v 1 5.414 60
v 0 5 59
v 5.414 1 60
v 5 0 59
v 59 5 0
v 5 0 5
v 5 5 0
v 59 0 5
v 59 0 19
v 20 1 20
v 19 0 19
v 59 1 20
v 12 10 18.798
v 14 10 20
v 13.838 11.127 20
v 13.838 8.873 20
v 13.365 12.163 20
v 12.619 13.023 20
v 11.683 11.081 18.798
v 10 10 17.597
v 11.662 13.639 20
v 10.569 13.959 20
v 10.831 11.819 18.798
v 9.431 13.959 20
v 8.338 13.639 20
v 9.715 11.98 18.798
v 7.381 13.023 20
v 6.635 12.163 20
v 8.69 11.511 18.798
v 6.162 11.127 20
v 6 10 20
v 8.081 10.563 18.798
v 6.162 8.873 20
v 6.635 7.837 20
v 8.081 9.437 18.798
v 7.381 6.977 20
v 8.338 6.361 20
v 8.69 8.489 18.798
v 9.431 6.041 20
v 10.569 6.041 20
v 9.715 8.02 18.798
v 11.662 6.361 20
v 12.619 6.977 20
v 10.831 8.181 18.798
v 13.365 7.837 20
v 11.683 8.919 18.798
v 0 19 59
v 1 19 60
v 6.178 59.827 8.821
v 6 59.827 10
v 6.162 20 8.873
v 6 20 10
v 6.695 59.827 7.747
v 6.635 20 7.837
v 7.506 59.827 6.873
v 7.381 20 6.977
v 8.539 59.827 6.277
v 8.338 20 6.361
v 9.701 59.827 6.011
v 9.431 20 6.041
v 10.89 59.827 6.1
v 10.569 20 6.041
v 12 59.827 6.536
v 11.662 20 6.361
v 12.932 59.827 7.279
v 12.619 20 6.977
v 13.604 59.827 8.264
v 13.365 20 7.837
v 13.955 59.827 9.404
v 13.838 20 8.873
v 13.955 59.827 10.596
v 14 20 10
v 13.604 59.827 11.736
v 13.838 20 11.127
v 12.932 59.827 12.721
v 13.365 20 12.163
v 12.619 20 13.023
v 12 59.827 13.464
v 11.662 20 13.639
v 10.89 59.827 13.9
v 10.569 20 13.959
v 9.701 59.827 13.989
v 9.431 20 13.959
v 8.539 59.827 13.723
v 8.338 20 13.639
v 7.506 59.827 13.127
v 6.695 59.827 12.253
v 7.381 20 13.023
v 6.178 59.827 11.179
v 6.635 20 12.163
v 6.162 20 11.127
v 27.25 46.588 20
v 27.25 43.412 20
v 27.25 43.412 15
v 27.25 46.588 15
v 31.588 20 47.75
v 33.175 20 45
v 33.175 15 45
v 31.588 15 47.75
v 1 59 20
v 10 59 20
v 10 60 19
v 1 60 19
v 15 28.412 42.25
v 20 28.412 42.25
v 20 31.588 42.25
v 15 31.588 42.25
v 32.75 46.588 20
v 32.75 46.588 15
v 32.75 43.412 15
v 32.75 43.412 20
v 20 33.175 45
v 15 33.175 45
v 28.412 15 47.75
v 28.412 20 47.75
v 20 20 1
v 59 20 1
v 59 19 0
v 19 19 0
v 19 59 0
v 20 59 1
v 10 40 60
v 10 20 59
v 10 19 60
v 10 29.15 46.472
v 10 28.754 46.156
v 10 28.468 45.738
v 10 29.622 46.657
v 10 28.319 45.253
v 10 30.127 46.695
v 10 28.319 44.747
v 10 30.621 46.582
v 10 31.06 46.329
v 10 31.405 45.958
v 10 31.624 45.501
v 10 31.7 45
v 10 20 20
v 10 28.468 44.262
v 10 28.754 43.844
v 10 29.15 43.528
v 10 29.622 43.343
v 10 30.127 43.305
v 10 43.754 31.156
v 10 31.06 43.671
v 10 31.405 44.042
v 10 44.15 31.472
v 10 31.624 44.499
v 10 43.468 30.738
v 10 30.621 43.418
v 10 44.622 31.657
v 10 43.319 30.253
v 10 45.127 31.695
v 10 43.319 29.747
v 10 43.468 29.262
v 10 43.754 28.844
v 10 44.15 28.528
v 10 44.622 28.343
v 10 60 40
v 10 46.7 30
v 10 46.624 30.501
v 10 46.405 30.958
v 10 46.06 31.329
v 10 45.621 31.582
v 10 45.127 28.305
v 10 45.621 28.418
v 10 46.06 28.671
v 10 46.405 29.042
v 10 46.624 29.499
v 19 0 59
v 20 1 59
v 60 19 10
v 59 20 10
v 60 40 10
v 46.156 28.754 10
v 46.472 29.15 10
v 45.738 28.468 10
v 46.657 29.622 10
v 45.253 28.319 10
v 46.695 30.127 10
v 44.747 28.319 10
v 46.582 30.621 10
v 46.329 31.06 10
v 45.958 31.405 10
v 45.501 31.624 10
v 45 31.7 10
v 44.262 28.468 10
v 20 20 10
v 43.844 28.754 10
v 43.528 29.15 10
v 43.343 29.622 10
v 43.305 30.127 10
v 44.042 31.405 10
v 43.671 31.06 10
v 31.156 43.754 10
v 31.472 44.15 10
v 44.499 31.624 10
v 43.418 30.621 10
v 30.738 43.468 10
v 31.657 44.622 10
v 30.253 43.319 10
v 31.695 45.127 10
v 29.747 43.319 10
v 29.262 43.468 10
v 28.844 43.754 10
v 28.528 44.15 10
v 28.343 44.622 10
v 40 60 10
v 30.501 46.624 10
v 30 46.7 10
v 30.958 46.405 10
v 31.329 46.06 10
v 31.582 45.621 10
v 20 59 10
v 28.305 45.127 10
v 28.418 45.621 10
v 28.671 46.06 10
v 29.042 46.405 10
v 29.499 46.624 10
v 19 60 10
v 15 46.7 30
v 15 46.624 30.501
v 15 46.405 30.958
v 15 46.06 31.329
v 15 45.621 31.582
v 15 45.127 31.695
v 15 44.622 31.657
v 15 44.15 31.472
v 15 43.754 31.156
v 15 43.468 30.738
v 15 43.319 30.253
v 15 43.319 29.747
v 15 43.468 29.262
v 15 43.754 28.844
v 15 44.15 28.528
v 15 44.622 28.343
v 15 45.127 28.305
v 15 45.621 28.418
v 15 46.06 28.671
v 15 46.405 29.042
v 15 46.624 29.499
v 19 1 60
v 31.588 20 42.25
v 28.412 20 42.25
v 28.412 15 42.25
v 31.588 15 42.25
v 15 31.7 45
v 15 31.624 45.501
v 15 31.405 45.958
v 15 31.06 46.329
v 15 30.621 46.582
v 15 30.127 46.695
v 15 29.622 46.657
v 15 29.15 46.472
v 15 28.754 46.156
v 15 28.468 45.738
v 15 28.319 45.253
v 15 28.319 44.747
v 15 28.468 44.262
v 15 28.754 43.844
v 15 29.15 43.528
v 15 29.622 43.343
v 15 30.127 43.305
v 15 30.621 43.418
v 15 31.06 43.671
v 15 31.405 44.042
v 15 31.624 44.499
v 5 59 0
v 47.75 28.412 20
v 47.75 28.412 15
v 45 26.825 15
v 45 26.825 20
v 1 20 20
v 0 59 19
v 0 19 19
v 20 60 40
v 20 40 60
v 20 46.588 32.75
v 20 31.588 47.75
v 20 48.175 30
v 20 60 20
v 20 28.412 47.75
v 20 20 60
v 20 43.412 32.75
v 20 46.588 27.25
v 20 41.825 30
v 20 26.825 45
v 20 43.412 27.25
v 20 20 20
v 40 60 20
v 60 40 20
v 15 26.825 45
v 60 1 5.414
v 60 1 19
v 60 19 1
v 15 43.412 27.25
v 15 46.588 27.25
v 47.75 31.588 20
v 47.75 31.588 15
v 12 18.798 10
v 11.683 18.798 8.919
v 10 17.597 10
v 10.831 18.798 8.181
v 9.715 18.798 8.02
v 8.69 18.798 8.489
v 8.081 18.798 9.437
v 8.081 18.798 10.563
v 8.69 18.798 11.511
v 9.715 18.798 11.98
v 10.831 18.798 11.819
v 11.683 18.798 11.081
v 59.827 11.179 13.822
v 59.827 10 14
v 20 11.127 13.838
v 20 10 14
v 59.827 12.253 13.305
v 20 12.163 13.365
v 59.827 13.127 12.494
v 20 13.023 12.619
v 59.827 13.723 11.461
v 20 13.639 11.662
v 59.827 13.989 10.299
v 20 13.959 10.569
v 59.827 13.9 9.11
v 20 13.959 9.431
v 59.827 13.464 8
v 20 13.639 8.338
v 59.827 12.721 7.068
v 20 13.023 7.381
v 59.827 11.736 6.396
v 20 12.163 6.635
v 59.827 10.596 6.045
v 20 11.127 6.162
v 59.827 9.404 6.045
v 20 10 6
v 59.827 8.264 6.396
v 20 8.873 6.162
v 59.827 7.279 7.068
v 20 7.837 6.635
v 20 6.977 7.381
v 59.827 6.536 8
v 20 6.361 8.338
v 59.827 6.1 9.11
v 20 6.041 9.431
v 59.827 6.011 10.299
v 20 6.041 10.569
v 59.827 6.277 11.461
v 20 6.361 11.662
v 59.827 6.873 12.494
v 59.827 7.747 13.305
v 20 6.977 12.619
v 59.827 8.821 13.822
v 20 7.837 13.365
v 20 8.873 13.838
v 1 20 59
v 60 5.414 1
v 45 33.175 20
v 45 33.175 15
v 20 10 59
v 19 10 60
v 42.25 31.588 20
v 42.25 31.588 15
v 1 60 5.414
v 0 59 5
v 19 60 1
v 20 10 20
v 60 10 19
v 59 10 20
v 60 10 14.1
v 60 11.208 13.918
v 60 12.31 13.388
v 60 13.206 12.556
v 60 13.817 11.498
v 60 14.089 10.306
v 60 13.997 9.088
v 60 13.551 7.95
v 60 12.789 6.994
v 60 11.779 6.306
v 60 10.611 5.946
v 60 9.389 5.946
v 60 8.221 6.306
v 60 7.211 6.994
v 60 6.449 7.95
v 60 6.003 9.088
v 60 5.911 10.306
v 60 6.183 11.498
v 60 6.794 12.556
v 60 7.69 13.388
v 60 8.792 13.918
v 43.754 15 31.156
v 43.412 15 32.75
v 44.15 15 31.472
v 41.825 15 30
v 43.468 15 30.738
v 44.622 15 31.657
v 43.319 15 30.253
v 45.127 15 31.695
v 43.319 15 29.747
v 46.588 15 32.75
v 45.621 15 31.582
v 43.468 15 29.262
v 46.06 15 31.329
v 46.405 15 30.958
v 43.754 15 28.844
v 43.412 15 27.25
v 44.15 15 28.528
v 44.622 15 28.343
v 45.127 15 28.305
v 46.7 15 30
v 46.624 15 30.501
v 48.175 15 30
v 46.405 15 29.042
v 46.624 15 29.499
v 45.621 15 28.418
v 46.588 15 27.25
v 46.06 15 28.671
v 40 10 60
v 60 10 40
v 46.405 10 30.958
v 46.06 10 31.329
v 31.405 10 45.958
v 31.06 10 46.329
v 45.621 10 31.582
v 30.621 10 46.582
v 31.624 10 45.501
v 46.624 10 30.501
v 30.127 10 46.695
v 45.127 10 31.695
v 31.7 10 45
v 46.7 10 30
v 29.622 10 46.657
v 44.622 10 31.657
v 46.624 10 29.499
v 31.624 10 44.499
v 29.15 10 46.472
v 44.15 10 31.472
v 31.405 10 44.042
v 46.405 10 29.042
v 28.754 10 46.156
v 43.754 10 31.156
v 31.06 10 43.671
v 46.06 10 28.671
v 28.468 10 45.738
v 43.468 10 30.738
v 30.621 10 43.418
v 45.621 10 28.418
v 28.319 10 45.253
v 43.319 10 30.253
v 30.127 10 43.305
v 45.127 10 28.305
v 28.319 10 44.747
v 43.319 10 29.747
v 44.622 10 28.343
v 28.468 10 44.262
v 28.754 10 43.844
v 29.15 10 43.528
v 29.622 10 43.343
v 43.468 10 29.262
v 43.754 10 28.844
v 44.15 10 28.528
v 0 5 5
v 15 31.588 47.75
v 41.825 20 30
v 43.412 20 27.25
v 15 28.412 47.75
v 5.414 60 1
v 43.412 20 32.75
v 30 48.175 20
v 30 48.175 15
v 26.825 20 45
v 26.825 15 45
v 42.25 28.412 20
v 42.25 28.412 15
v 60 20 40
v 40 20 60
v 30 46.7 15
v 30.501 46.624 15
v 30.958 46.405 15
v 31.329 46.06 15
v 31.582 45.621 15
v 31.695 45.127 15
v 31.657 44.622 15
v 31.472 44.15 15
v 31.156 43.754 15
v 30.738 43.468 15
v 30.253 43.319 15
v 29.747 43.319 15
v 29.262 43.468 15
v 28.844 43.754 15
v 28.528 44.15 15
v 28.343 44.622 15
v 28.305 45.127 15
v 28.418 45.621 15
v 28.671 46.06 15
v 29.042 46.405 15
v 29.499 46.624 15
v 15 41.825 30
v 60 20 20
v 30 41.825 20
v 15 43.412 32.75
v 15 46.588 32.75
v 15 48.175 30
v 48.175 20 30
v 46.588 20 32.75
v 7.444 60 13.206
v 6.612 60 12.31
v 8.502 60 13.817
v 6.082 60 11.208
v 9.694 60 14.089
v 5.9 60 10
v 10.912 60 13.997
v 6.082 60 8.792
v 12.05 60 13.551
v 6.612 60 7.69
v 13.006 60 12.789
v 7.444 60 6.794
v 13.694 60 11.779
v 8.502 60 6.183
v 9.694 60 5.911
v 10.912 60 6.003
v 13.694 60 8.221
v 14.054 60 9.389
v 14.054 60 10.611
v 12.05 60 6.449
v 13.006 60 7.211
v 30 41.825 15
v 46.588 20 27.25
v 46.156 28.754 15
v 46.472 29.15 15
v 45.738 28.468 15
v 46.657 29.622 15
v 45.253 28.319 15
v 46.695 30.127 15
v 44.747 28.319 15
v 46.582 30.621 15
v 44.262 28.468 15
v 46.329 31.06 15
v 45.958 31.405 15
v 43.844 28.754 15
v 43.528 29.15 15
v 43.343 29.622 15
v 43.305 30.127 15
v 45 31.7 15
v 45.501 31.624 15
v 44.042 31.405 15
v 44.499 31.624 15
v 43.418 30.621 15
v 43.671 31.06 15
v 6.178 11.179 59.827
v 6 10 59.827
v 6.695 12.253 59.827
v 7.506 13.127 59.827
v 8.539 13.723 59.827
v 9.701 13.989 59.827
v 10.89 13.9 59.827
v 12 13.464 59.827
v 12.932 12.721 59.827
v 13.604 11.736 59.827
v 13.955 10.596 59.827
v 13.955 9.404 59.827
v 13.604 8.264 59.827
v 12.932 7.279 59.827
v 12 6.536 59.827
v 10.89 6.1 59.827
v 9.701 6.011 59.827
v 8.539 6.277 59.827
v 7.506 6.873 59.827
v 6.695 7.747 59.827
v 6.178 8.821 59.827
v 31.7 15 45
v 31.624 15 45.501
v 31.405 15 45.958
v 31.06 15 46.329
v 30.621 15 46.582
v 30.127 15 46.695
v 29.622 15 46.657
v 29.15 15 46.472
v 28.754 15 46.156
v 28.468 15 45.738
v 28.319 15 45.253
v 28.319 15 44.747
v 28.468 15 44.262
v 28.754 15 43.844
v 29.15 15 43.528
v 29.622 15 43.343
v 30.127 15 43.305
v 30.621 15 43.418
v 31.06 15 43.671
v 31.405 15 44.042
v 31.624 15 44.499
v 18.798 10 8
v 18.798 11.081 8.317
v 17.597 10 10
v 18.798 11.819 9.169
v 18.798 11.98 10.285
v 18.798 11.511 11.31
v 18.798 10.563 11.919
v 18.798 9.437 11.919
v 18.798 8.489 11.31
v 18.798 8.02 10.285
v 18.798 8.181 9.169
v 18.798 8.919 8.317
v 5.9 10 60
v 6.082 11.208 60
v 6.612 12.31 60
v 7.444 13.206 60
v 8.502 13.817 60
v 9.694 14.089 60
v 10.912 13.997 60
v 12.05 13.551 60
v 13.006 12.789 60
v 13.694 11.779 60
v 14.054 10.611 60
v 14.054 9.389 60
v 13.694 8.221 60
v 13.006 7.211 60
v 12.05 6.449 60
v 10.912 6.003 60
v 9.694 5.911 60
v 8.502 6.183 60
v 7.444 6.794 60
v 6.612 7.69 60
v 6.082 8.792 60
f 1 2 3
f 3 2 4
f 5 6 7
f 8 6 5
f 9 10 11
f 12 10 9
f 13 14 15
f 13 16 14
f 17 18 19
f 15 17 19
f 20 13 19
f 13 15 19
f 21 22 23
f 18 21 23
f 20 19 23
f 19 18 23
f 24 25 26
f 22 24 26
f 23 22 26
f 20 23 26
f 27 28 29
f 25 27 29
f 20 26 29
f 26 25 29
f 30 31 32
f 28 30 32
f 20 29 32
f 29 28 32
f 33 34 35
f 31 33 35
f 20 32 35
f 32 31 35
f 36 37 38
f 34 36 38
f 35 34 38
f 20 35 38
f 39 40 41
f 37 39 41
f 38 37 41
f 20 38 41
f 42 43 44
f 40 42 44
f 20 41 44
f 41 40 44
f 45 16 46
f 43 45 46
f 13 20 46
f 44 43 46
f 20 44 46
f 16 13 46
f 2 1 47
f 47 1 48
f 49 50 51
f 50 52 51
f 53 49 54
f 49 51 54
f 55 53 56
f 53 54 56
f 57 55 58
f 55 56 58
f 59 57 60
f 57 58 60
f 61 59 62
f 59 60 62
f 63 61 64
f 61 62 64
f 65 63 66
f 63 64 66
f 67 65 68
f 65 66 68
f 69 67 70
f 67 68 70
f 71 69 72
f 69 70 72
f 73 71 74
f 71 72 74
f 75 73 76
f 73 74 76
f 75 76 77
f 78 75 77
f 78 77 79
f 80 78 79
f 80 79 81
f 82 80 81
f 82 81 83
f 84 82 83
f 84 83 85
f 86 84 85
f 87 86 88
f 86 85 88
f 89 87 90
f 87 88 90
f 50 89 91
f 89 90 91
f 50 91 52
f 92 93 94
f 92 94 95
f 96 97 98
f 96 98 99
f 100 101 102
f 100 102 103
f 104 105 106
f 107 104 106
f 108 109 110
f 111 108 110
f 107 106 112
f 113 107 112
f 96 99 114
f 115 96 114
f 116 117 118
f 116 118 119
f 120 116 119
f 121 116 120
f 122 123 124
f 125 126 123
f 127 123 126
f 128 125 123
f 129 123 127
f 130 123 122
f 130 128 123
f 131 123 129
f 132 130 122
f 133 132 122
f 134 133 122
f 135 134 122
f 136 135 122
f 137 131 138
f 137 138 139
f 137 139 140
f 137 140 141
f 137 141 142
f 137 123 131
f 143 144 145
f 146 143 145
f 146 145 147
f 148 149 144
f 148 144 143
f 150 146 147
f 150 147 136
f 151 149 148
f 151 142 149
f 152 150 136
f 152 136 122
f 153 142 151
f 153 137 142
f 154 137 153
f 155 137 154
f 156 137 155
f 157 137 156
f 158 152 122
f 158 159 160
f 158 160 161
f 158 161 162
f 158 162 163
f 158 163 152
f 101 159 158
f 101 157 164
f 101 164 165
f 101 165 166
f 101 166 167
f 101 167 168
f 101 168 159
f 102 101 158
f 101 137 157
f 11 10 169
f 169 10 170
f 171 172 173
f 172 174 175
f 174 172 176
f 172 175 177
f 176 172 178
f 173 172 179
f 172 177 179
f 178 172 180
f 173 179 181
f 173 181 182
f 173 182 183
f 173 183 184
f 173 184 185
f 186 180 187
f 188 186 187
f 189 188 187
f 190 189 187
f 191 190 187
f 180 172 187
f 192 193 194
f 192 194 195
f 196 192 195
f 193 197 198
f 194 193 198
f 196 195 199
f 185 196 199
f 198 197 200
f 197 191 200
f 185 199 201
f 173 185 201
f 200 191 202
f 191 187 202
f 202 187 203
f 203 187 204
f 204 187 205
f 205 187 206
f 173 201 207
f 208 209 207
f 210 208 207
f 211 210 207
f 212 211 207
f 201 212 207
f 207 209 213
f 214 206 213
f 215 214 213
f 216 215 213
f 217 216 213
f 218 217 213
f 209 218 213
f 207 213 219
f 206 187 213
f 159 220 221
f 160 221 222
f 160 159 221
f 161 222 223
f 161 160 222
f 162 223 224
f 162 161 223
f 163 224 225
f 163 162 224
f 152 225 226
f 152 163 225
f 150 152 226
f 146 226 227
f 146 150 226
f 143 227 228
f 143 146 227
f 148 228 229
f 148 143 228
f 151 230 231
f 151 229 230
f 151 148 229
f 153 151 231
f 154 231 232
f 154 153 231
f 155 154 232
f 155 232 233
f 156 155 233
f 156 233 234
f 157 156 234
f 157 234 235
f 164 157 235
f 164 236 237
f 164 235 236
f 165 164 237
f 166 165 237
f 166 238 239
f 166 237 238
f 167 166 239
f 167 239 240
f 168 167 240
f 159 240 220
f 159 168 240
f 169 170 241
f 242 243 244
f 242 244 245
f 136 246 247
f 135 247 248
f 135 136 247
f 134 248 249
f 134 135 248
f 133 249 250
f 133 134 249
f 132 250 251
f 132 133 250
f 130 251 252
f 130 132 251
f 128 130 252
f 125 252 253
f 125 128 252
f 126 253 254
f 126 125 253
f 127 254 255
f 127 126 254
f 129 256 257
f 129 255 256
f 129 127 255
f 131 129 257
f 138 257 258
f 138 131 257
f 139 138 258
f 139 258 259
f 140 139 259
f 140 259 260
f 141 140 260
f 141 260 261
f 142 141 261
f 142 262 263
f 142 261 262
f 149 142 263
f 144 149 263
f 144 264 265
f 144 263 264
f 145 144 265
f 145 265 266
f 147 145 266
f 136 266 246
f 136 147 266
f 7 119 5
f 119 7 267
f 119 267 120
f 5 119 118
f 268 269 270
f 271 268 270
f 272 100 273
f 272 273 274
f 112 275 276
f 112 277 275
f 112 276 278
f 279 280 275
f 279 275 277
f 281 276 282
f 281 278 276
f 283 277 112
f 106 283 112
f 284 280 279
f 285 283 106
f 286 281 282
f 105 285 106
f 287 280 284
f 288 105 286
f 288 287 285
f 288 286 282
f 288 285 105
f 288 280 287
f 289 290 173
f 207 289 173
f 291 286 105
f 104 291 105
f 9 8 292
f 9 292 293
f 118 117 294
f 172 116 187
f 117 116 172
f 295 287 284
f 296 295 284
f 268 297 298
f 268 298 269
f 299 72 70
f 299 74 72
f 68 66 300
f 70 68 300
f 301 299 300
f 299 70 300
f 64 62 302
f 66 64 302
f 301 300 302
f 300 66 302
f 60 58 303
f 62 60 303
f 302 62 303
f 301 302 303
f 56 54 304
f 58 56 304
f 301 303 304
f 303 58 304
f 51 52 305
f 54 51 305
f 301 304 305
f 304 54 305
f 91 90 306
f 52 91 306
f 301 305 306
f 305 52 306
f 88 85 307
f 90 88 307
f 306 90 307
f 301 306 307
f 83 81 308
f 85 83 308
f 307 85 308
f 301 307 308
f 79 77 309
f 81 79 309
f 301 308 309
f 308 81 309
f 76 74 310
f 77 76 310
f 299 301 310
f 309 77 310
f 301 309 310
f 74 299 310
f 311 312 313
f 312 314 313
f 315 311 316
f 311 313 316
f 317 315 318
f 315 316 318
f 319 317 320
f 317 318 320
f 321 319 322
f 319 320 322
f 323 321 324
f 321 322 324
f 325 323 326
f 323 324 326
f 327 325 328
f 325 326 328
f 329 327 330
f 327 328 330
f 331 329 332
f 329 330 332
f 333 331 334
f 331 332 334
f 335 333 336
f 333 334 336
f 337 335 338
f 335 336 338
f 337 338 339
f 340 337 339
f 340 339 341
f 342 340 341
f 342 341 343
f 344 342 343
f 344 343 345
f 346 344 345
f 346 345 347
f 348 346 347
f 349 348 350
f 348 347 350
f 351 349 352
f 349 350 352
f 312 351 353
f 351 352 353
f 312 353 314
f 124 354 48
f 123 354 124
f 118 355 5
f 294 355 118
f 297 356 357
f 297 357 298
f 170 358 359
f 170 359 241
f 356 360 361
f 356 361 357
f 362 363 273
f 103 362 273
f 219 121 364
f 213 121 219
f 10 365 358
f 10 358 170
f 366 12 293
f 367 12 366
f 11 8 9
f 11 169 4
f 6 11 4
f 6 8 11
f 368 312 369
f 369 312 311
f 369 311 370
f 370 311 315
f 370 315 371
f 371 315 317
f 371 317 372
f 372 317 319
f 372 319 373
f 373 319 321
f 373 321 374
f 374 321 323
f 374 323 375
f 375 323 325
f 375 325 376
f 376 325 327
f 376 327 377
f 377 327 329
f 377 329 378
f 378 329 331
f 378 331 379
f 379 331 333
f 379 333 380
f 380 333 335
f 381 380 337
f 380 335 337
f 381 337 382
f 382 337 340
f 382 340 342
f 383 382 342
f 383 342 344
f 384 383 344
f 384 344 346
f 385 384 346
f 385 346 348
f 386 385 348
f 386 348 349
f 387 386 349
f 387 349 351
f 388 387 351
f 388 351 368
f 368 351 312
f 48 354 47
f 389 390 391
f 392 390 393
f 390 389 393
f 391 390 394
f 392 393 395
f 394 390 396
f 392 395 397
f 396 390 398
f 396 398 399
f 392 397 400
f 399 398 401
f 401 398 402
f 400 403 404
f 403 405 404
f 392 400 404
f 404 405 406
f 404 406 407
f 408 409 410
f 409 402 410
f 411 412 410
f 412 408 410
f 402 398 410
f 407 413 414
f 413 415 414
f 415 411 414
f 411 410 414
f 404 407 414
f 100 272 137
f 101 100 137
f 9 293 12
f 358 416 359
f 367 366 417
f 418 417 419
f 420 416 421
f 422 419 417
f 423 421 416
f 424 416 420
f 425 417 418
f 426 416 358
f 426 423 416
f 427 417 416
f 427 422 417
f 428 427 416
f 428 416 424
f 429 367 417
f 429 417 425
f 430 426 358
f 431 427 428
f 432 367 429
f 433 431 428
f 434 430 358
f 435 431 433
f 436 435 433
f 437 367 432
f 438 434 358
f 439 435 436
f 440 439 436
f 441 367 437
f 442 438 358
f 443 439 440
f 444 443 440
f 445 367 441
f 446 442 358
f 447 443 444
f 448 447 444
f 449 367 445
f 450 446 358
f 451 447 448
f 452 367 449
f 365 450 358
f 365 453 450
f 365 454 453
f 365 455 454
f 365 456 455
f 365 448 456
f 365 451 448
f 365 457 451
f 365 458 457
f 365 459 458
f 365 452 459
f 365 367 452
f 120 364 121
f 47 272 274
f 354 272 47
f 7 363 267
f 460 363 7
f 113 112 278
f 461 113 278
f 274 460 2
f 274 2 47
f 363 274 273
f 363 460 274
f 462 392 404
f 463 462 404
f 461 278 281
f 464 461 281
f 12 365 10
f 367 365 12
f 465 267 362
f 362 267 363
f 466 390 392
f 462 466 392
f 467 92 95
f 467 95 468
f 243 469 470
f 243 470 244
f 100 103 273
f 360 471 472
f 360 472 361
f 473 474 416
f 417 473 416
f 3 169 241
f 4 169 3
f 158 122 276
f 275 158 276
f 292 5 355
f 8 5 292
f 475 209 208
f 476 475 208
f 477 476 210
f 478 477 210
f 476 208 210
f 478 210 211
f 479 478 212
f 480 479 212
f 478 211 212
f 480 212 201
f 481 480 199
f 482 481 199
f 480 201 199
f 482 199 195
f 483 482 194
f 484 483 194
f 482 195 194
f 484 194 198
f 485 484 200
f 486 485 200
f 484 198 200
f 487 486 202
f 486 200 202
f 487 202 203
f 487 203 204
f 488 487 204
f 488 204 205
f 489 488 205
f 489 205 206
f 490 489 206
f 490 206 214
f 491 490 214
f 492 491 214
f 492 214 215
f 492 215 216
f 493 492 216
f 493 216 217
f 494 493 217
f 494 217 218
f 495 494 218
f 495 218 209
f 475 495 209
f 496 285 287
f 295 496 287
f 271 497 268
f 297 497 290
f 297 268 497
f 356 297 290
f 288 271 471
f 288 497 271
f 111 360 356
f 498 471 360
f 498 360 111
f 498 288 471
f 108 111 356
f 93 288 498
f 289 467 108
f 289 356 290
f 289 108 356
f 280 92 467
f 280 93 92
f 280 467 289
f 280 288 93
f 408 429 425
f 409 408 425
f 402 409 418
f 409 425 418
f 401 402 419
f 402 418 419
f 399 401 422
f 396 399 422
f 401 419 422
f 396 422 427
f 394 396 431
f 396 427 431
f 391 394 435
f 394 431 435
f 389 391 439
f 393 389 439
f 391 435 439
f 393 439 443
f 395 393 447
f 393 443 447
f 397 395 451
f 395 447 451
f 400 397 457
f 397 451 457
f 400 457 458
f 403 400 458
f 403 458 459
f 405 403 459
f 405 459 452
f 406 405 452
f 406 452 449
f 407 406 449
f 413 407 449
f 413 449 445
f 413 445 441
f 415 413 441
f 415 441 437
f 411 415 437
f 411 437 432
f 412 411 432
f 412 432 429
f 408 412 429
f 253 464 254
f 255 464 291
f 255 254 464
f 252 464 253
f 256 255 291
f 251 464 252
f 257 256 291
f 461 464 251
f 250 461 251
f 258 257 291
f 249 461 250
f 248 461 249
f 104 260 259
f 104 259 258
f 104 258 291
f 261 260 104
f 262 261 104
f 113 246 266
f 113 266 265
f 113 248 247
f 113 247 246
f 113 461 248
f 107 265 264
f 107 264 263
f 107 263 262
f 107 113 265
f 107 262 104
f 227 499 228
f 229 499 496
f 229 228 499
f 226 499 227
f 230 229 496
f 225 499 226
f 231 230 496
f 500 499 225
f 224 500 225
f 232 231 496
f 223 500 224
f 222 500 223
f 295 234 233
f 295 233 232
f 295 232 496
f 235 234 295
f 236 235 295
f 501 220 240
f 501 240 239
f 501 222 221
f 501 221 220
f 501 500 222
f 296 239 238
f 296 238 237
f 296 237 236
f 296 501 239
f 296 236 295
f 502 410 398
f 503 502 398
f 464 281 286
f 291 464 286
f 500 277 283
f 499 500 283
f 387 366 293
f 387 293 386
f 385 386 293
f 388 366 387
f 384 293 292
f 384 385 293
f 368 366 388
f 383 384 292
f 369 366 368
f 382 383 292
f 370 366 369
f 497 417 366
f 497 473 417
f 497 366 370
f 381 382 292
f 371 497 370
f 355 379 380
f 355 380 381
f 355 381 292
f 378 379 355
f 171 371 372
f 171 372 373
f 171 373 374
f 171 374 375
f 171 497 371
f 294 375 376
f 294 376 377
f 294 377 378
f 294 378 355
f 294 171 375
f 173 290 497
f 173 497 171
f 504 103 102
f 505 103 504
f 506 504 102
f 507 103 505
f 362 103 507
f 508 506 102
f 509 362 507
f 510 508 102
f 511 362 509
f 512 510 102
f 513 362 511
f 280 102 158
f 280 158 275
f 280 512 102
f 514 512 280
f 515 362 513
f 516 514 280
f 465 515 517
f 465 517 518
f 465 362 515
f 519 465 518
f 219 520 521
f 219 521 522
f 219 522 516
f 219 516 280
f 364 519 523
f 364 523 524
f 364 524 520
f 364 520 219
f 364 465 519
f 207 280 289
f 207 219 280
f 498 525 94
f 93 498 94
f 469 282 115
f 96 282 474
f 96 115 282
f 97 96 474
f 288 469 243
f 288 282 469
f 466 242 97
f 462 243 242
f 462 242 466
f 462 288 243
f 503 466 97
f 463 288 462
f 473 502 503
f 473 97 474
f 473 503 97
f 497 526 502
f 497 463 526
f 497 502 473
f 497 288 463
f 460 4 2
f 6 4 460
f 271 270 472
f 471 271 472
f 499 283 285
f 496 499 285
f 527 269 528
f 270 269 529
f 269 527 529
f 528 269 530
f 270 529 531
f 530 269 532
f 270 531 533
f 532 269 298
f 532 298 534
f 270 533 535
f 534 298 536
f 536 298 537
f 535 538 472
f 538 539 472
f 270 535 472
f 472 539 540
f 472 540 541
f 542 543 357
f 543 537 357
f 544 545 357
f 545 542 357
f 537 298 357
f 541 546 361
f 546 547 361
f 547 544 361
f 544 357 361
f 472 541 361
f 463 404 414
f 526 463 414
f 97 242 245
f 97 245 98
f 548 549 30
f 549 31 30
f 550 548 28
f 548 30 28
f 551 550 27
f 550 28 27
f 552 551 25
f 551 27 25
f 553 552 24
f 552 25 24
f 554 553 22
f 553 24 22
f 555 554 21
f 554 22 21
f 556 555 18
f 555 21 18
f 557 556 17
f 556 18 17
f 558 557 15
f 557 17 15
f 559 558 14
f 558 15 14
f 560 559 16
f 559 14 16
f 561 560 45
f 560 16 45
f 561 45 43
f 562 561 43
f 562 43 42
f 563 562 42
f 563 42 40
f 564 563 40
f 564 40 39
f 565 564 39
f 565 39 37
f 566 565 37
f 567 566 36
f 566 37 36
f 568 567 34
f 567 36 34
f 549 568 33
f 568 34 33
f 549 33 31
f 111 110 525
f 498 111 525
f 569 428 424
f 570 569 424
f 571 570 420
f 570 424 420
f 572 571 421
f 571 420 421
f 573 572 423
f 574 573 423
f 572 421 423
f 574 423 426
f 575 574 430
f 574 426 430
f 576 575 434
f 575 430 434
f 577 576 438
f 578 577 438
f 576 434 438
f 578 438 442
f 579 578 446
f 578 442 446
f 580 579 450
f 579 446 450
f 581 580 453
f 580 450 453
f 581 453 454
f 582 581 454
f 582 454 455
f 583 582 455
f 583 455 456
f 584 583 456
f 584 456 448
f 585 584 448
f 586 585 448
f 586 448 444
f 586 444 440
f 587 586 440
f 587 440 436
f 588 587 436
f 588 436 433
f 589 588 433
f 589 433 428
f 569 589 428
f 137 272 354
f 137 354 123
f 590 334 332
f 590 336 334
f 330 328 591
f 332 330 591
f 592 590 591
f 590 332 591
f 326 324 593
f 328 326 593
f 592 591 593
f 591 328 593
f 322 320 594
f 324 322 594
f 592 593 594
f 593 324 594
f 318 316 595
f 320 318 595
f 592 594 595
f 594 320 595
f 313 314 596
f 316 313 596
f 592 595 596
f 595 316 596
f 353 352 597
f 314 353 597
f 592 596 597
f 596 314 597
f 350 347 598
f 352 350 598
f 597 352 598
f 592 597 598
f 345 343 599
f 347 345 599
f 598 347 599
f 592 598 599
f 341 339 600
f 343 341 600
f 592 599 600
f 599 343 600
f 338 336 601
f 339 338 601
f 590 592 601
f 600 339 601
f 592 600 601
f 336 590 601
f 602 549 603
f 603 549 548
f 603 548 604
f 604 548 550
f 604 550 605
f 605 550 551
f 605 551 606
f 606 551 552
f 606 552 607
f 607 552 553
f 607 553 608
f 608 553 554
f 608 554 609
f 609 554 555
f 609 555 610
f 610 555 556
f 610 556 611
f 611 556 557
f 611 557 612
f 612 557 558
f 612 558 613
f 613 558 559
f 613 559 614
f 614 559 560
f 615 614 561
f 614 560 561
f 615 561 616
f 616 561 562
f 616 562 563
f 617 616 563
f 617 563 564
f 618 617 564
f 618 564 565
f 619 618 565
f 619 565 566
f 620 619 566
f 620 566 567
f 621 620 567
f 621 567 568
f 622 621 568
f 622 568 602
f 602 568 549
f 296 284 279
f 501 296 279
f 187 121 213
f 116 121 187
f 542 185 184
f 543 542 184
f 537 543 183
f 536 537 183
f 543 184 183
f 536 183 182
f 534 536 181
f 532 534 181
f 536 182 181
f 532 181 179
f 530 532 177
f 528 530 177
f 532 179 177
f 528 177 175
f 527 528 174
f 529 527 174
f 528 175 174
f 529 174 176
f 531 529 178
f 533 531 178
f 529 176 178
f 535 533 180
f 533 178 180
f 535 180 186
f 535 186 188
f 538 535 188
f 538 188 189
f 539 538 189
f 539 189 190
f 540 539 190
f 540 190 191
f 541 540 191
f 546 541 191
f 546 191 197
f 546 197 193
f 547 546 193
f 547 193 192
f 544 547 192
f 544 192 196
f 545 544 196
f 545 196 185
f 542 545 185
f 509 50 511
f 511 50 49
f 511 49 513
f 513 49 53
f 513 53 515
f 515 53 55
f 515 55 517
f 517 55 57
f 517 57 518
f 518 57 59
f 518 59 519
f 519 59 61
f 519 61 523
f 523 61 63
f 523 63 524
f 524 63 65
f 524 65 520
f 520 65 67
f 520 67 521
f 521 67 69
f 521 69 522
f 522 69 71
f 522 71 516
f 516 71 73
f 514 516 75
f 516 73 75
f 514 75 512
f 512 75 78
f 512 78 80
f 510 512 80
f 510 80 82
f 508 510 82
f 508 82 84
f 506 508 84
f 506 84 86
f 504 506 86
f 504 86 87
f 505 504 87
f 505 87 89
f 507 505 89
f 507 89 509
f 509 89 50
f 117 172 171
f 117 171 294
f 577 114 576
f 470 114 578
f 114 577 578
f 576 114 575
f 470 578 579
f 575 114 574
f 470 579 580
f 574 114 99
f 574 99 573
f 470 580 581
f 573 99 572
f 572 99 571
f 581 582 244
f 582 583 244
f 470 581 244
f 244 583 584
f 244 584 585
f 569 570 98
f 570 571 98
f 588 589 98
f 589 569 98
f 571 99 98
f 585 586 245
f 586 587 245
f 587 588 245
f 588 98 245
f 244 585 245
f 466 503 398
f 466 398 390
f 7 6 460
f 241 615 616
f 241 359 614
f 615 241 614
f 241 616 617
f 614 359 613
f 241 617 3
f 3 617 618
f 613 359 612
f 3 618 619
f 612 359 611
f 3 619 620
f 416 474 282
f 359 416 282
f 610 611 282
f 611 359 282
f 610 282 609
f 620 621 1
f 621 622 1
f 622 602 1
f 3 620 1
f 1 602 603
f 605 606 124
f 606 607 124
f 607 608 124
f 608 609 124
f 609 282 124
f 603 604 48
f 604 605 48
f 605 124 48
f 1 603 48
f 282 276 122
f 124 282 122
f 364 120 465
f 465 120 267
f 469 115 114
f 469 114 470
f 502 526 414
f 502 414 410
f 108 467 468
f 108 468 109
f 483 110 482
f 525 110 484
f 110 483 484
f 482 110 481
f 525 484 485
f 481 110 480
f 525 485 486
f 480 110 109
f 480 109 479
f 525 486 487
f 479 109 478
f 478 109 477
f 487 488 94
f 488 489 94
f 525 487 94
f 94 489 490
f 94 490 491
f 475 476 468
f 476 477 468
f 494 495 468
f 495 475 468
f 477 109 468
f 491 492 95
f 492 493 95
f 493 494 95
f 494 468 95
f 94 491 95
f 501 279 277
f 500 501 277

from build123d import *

# Parameters (mm, degrees)
BASE_SHAPE_BASE_DEPTH        = 20
BASE_SHAPE_EXTENSION_DEPTH   = 40
BASE_SHAPE_FINISH_SKETCH_W   = 10
BASE_SHAPE_FINISH_SKETCH_H   = 40
BASE_SHAPE_FINISH_DEPTH      = 40
ROD_HOLE_D8_Z_D              = 8
ROD_HOLE_D8_Z_DEPTH          = 40
ROD_HOLE_D8_Z_CSINK_D        = 8.2
ROD_HOLE_D8_Z_CSINK_ANGLE    = 60
ROD_HOLE_D8_Z_TIP            = 2.403442476
ROD_HOLE_D8_X_D              = 8
ROD_HOLE_D8_X_DEPTH          = 40
ROD_HOLE_D8_X_CSINK_D        = 8.2
ROD_HOLE_D8_X_CSINK_ANGLE    = 60
ROD_HOLE_D8_X_TIP            = 2.403442476
ROD_HOLE_D8_Y_D              = 8
ROD_HOLE_D8_Y_DEPTH          = 40
ROD_HOLE_D8_Y_CSINK_D        = 8.2
ROD_HOLE_D8_Y_CSINK_ANGLE    = 60
ROD_HOLE_D8_Y_TIP            = 2.403442476
OUTER_CHAMFERS_SIZE          = 5
INNER_SMALLER_CHAMFERS_SIZE  = 1
LARGE_CHAMFERS_SIZE          = 20
HULL_PART_HOLES_M3_START     = 10
HULL_PART_HOLES_M3_OUTLINE_R = 1.7
HULL_PART_HOLES_M3_DEPTH     = 10
HULL_PART_NUT_HOLE_DEPTH     = 5


# Read off the part's stored shape, not the designer's step: hull_part_holes_m3
with BuildPart() as part:
    # base_shape_sketch → base_shape_base (new body)
    with BuildSketch(Plane.XY):
        Polygon((0, 0), (60, 0), (60, 20), (20, 20), (20, 60), (0, 60), align=None)
    extrude(amount=BASE_SHAPE_BASE_DEPTH)

    # base_shape_extension_sketch → base_shape_extension (add)
    with BuildSketch(Plane.XY.offset(20)):
        Polygon((20, 60), (20, 20), (60, 20), (60, 10), (20, 10), (20, 0), (0, 0), (0, 20), (10, 20), (10, 60), align=None)
    extrude(amount=BASE_SHAPE_EXTENSION_DEPTH)

    # base_shape_finish_sketch → base_shape_finish (add)
    with BuildSketch(Plane(origin=(20, 0, 0), x_dir=(0, 0, -1), z_dir=(1, 0, 0))):
        with Locations((-15, 40)):
            Rectangle(BASE_SHAPE_FINISH_SKETCH_W, BASE_SHAPE_FINISH_SKETCH_H)
    extrude(amount=BASE_SHAPE_FINISH_DEPTH)

    # rod_hole_d8_z
    with Locations(Plane.XY.offset(60)):
        with Locations((10, 10)):
            CounterSinkHole(ROD_HOLE_D8_Z_D / 2, ROD_HOLE_D8_Z_CSINK_D / 2, depth=ROD_HOLE_D8_Z_DEPTH, counter_sink_angle=ROD_HOLE_D8_Z_CSINK_ANGLE)
            with Locations((0, 0, -(ROD_HOLE_D8_Z_DEPTH + ROD_HOLE_D8_Z_TIP / 2))):  # 118° drill point
                Cone(0, ROD_HOLE_D8_Z_D / 2, ROD_HOLE_D8_Z_TIP, mode=Mode.SUBTRACT)

    # rod_hole_d8_x
    with Locations(Plane(origin=(60, 0, 0), x_dir=(0, 0, -1), z_dir=(1, 0, 0))):
        with Locations((-10, 10)):
            CounterSinkHole(ROD_HOLE_D8_X_D / 2, ROD_HOLE_D8_X_CSINK_D / 2, depth=ROD_HOLE_D8_X_DEPTH, counter_sink_angle=ROD_HOLE_D8_X_CSINK_ANGLE)
            with Locations((0, 0, -(ROD_HOLE_D8_X_DEPTH + ROD_HOLE_D8_X_TIP / 2))):  # 118° drill point
                Cone(0, ROD_HOLE_D8_X_D / 2, ROD_HOLE_D8_X_TIP, mode=Mode.SUBTRACT)

    # rod_hole_d8_y
    with Locations(Plane(origin=(0, 60, 0), x_dir=(1, 0, 0), z_dir=(0, 1, 0))):
        with Locations((10, -10)):
            CounterSinkHole(ROD_HOLE_D8_Y_D / 2, ROD_HOLE_D8_Y_CSINK_D / 2, depth=ROD_HOLE_D8_Y_DEPTH, counter_sink_angle=ROD_HOLE_D8_Y_CSINK_ANGLE)
            with Locations((0, 0, -(ROD_HOLE_D8_Y_DEPTH + ROD_HOLE_D8_Y_TIP / 2))):  # 118° drill point
                Cone(0, ROD_HOLE_D8_Y_D / 2, ROD_HOLE_D8_Y_TIP, mode=Mode.SUBTRACT)

    # outer_chamfers
    outer_chamfers_edges = [part.edges().sort_by_distance(p)[0] for p in [
        (0, 0, 30),
        (30, 0, 0),
        (0, 30, 0),
    ]]
    chamfer(outer_chamfers_edges, length=OUTER_CHAMFERS_SIZE)

    # inner_smaller_chamfers
    inner_smaller_chamfers_edges = [part.edges().sort_by_distance(p)[0] for p in [
        (0, 60, 12.5),
        (60, 0, 12.5),
        (60, 5, 20),
        (40, 0, 20),
        (5, 60, 20),
        (0, 20, 40),
        (20, 0, 40),
        (5, 20, 60),
        (0, 12.5, 60),
        (20, 5, 60),
        (20, 60, 5),
        (0, 40, 20),
        (60, 20, 5),
        (12.5, 60, 0),
        (20, 40, 0),
        (40, 20, 0),
        (12.5, 0, 60),
        (2.5, 2.5, 60),
        (60, 12.5, 0),
        (60, 2.5, 2.5),
        (2.5, 60, 2.5),
    ]]
    chamfer(inner_smaller_chamfers_edges, length=INNER_SMALLER_CHAMFERS_SIZE)

    # large_chamfers
    large_chamfers_edges = [part.edges().sort_by_distance(p)[0] for p in [
        (15, 60, 60),
        (60, 15, 60),
        (60, 60, 15),
    ]]
    chamfer(large_chamfers_edges, length=LARGE_CHAMFERS_SIZE)

    # hull_part_holes_m3 outline → hull_part_holes_m3 (cut)
    with BuildSketch(Plane.YZ.offset(HULL_PART_HOLES_M3_START)):
        with Locations((45, 30)):
            Circle(HULL_PART_HOLES_M3_OUTLINE_R)
        with Locations((30, 45)):
            Circle(HULL_PART_HOLES_M3_OUTLINE_R)
    hull_part_holes_m3 = extrude(amount=HULL_PART_HOLES_M3_DEPTH, mode=Mode.SUBTRACT)

    # Sketch12 → hull_part_nut_hole (cut)
    with BuildSketch(Plane(origin=(20, 0, 0), x_dir=(0, 0, -1), z_dir=(1, 0, 0))):
        Polygon((-30, 48.175426481), (-32.75, 46.58771324), (-32.75, 43.41228676), (-30, 41.824573519), (-27.25, 43.41228676), (-27.25, 46.58771324), align=None)
        Polygon((-45, 33.175426481), (-47.75, 31.58771324), (-47.75, 28.41228676), (-45, 26.824573519), (-42.25, 28.41228676), (-42.25, 31.58771324), align=None)
    hull_part_nut_hole = extrude(amount=-HULL_PART_NUT_HOLE_DEPTH, mode=Mode.SUBTRACT)

    # hull_part_holes_mirror_x: hull_part_holes_m3, hull_part_nut_hole across plane
    add(hull_part_holes_m3.mirror(Plane(origin=(0, 0, 0), x_dir=(0.7071067811865482, 0, 0.7071067811865468), z_dir=(-0.707106781186547, 0, 0.7071067811865481))), mode=Mode.SUBTRACT)
    add(hull_part_nut_hole.mirror(Plane(origin=(0, 0, 0), x_dir=(0.7071067811865482, 0, 0.7071067811865468), z_dir=(-0.707106781186547, 0, 0.7071067811865481))), mode=Mode.SUBTRACT)

    # hull_part_holes_mirror_y: hull_part_holes_m3, hull_part_nut_hole across plane
    add(hull_part_holes_m3.mirror(Plane(origin=(0, 0, 0), x_dir=(0, 0, 1), z_dir=(-0.7071067811865482, 0.7071067811865469, 0))), mode=Mode.SUBTRACT)
    add(hull_part_nut_hole.mirror(Plane(origin=(0, 0, 0), x_dir=(0, 0, 1), z_dir=(-0.7071067811865482, 0.7071067811865469, 0))), mode=Mode.SUBTRACT)


solid = part.part
